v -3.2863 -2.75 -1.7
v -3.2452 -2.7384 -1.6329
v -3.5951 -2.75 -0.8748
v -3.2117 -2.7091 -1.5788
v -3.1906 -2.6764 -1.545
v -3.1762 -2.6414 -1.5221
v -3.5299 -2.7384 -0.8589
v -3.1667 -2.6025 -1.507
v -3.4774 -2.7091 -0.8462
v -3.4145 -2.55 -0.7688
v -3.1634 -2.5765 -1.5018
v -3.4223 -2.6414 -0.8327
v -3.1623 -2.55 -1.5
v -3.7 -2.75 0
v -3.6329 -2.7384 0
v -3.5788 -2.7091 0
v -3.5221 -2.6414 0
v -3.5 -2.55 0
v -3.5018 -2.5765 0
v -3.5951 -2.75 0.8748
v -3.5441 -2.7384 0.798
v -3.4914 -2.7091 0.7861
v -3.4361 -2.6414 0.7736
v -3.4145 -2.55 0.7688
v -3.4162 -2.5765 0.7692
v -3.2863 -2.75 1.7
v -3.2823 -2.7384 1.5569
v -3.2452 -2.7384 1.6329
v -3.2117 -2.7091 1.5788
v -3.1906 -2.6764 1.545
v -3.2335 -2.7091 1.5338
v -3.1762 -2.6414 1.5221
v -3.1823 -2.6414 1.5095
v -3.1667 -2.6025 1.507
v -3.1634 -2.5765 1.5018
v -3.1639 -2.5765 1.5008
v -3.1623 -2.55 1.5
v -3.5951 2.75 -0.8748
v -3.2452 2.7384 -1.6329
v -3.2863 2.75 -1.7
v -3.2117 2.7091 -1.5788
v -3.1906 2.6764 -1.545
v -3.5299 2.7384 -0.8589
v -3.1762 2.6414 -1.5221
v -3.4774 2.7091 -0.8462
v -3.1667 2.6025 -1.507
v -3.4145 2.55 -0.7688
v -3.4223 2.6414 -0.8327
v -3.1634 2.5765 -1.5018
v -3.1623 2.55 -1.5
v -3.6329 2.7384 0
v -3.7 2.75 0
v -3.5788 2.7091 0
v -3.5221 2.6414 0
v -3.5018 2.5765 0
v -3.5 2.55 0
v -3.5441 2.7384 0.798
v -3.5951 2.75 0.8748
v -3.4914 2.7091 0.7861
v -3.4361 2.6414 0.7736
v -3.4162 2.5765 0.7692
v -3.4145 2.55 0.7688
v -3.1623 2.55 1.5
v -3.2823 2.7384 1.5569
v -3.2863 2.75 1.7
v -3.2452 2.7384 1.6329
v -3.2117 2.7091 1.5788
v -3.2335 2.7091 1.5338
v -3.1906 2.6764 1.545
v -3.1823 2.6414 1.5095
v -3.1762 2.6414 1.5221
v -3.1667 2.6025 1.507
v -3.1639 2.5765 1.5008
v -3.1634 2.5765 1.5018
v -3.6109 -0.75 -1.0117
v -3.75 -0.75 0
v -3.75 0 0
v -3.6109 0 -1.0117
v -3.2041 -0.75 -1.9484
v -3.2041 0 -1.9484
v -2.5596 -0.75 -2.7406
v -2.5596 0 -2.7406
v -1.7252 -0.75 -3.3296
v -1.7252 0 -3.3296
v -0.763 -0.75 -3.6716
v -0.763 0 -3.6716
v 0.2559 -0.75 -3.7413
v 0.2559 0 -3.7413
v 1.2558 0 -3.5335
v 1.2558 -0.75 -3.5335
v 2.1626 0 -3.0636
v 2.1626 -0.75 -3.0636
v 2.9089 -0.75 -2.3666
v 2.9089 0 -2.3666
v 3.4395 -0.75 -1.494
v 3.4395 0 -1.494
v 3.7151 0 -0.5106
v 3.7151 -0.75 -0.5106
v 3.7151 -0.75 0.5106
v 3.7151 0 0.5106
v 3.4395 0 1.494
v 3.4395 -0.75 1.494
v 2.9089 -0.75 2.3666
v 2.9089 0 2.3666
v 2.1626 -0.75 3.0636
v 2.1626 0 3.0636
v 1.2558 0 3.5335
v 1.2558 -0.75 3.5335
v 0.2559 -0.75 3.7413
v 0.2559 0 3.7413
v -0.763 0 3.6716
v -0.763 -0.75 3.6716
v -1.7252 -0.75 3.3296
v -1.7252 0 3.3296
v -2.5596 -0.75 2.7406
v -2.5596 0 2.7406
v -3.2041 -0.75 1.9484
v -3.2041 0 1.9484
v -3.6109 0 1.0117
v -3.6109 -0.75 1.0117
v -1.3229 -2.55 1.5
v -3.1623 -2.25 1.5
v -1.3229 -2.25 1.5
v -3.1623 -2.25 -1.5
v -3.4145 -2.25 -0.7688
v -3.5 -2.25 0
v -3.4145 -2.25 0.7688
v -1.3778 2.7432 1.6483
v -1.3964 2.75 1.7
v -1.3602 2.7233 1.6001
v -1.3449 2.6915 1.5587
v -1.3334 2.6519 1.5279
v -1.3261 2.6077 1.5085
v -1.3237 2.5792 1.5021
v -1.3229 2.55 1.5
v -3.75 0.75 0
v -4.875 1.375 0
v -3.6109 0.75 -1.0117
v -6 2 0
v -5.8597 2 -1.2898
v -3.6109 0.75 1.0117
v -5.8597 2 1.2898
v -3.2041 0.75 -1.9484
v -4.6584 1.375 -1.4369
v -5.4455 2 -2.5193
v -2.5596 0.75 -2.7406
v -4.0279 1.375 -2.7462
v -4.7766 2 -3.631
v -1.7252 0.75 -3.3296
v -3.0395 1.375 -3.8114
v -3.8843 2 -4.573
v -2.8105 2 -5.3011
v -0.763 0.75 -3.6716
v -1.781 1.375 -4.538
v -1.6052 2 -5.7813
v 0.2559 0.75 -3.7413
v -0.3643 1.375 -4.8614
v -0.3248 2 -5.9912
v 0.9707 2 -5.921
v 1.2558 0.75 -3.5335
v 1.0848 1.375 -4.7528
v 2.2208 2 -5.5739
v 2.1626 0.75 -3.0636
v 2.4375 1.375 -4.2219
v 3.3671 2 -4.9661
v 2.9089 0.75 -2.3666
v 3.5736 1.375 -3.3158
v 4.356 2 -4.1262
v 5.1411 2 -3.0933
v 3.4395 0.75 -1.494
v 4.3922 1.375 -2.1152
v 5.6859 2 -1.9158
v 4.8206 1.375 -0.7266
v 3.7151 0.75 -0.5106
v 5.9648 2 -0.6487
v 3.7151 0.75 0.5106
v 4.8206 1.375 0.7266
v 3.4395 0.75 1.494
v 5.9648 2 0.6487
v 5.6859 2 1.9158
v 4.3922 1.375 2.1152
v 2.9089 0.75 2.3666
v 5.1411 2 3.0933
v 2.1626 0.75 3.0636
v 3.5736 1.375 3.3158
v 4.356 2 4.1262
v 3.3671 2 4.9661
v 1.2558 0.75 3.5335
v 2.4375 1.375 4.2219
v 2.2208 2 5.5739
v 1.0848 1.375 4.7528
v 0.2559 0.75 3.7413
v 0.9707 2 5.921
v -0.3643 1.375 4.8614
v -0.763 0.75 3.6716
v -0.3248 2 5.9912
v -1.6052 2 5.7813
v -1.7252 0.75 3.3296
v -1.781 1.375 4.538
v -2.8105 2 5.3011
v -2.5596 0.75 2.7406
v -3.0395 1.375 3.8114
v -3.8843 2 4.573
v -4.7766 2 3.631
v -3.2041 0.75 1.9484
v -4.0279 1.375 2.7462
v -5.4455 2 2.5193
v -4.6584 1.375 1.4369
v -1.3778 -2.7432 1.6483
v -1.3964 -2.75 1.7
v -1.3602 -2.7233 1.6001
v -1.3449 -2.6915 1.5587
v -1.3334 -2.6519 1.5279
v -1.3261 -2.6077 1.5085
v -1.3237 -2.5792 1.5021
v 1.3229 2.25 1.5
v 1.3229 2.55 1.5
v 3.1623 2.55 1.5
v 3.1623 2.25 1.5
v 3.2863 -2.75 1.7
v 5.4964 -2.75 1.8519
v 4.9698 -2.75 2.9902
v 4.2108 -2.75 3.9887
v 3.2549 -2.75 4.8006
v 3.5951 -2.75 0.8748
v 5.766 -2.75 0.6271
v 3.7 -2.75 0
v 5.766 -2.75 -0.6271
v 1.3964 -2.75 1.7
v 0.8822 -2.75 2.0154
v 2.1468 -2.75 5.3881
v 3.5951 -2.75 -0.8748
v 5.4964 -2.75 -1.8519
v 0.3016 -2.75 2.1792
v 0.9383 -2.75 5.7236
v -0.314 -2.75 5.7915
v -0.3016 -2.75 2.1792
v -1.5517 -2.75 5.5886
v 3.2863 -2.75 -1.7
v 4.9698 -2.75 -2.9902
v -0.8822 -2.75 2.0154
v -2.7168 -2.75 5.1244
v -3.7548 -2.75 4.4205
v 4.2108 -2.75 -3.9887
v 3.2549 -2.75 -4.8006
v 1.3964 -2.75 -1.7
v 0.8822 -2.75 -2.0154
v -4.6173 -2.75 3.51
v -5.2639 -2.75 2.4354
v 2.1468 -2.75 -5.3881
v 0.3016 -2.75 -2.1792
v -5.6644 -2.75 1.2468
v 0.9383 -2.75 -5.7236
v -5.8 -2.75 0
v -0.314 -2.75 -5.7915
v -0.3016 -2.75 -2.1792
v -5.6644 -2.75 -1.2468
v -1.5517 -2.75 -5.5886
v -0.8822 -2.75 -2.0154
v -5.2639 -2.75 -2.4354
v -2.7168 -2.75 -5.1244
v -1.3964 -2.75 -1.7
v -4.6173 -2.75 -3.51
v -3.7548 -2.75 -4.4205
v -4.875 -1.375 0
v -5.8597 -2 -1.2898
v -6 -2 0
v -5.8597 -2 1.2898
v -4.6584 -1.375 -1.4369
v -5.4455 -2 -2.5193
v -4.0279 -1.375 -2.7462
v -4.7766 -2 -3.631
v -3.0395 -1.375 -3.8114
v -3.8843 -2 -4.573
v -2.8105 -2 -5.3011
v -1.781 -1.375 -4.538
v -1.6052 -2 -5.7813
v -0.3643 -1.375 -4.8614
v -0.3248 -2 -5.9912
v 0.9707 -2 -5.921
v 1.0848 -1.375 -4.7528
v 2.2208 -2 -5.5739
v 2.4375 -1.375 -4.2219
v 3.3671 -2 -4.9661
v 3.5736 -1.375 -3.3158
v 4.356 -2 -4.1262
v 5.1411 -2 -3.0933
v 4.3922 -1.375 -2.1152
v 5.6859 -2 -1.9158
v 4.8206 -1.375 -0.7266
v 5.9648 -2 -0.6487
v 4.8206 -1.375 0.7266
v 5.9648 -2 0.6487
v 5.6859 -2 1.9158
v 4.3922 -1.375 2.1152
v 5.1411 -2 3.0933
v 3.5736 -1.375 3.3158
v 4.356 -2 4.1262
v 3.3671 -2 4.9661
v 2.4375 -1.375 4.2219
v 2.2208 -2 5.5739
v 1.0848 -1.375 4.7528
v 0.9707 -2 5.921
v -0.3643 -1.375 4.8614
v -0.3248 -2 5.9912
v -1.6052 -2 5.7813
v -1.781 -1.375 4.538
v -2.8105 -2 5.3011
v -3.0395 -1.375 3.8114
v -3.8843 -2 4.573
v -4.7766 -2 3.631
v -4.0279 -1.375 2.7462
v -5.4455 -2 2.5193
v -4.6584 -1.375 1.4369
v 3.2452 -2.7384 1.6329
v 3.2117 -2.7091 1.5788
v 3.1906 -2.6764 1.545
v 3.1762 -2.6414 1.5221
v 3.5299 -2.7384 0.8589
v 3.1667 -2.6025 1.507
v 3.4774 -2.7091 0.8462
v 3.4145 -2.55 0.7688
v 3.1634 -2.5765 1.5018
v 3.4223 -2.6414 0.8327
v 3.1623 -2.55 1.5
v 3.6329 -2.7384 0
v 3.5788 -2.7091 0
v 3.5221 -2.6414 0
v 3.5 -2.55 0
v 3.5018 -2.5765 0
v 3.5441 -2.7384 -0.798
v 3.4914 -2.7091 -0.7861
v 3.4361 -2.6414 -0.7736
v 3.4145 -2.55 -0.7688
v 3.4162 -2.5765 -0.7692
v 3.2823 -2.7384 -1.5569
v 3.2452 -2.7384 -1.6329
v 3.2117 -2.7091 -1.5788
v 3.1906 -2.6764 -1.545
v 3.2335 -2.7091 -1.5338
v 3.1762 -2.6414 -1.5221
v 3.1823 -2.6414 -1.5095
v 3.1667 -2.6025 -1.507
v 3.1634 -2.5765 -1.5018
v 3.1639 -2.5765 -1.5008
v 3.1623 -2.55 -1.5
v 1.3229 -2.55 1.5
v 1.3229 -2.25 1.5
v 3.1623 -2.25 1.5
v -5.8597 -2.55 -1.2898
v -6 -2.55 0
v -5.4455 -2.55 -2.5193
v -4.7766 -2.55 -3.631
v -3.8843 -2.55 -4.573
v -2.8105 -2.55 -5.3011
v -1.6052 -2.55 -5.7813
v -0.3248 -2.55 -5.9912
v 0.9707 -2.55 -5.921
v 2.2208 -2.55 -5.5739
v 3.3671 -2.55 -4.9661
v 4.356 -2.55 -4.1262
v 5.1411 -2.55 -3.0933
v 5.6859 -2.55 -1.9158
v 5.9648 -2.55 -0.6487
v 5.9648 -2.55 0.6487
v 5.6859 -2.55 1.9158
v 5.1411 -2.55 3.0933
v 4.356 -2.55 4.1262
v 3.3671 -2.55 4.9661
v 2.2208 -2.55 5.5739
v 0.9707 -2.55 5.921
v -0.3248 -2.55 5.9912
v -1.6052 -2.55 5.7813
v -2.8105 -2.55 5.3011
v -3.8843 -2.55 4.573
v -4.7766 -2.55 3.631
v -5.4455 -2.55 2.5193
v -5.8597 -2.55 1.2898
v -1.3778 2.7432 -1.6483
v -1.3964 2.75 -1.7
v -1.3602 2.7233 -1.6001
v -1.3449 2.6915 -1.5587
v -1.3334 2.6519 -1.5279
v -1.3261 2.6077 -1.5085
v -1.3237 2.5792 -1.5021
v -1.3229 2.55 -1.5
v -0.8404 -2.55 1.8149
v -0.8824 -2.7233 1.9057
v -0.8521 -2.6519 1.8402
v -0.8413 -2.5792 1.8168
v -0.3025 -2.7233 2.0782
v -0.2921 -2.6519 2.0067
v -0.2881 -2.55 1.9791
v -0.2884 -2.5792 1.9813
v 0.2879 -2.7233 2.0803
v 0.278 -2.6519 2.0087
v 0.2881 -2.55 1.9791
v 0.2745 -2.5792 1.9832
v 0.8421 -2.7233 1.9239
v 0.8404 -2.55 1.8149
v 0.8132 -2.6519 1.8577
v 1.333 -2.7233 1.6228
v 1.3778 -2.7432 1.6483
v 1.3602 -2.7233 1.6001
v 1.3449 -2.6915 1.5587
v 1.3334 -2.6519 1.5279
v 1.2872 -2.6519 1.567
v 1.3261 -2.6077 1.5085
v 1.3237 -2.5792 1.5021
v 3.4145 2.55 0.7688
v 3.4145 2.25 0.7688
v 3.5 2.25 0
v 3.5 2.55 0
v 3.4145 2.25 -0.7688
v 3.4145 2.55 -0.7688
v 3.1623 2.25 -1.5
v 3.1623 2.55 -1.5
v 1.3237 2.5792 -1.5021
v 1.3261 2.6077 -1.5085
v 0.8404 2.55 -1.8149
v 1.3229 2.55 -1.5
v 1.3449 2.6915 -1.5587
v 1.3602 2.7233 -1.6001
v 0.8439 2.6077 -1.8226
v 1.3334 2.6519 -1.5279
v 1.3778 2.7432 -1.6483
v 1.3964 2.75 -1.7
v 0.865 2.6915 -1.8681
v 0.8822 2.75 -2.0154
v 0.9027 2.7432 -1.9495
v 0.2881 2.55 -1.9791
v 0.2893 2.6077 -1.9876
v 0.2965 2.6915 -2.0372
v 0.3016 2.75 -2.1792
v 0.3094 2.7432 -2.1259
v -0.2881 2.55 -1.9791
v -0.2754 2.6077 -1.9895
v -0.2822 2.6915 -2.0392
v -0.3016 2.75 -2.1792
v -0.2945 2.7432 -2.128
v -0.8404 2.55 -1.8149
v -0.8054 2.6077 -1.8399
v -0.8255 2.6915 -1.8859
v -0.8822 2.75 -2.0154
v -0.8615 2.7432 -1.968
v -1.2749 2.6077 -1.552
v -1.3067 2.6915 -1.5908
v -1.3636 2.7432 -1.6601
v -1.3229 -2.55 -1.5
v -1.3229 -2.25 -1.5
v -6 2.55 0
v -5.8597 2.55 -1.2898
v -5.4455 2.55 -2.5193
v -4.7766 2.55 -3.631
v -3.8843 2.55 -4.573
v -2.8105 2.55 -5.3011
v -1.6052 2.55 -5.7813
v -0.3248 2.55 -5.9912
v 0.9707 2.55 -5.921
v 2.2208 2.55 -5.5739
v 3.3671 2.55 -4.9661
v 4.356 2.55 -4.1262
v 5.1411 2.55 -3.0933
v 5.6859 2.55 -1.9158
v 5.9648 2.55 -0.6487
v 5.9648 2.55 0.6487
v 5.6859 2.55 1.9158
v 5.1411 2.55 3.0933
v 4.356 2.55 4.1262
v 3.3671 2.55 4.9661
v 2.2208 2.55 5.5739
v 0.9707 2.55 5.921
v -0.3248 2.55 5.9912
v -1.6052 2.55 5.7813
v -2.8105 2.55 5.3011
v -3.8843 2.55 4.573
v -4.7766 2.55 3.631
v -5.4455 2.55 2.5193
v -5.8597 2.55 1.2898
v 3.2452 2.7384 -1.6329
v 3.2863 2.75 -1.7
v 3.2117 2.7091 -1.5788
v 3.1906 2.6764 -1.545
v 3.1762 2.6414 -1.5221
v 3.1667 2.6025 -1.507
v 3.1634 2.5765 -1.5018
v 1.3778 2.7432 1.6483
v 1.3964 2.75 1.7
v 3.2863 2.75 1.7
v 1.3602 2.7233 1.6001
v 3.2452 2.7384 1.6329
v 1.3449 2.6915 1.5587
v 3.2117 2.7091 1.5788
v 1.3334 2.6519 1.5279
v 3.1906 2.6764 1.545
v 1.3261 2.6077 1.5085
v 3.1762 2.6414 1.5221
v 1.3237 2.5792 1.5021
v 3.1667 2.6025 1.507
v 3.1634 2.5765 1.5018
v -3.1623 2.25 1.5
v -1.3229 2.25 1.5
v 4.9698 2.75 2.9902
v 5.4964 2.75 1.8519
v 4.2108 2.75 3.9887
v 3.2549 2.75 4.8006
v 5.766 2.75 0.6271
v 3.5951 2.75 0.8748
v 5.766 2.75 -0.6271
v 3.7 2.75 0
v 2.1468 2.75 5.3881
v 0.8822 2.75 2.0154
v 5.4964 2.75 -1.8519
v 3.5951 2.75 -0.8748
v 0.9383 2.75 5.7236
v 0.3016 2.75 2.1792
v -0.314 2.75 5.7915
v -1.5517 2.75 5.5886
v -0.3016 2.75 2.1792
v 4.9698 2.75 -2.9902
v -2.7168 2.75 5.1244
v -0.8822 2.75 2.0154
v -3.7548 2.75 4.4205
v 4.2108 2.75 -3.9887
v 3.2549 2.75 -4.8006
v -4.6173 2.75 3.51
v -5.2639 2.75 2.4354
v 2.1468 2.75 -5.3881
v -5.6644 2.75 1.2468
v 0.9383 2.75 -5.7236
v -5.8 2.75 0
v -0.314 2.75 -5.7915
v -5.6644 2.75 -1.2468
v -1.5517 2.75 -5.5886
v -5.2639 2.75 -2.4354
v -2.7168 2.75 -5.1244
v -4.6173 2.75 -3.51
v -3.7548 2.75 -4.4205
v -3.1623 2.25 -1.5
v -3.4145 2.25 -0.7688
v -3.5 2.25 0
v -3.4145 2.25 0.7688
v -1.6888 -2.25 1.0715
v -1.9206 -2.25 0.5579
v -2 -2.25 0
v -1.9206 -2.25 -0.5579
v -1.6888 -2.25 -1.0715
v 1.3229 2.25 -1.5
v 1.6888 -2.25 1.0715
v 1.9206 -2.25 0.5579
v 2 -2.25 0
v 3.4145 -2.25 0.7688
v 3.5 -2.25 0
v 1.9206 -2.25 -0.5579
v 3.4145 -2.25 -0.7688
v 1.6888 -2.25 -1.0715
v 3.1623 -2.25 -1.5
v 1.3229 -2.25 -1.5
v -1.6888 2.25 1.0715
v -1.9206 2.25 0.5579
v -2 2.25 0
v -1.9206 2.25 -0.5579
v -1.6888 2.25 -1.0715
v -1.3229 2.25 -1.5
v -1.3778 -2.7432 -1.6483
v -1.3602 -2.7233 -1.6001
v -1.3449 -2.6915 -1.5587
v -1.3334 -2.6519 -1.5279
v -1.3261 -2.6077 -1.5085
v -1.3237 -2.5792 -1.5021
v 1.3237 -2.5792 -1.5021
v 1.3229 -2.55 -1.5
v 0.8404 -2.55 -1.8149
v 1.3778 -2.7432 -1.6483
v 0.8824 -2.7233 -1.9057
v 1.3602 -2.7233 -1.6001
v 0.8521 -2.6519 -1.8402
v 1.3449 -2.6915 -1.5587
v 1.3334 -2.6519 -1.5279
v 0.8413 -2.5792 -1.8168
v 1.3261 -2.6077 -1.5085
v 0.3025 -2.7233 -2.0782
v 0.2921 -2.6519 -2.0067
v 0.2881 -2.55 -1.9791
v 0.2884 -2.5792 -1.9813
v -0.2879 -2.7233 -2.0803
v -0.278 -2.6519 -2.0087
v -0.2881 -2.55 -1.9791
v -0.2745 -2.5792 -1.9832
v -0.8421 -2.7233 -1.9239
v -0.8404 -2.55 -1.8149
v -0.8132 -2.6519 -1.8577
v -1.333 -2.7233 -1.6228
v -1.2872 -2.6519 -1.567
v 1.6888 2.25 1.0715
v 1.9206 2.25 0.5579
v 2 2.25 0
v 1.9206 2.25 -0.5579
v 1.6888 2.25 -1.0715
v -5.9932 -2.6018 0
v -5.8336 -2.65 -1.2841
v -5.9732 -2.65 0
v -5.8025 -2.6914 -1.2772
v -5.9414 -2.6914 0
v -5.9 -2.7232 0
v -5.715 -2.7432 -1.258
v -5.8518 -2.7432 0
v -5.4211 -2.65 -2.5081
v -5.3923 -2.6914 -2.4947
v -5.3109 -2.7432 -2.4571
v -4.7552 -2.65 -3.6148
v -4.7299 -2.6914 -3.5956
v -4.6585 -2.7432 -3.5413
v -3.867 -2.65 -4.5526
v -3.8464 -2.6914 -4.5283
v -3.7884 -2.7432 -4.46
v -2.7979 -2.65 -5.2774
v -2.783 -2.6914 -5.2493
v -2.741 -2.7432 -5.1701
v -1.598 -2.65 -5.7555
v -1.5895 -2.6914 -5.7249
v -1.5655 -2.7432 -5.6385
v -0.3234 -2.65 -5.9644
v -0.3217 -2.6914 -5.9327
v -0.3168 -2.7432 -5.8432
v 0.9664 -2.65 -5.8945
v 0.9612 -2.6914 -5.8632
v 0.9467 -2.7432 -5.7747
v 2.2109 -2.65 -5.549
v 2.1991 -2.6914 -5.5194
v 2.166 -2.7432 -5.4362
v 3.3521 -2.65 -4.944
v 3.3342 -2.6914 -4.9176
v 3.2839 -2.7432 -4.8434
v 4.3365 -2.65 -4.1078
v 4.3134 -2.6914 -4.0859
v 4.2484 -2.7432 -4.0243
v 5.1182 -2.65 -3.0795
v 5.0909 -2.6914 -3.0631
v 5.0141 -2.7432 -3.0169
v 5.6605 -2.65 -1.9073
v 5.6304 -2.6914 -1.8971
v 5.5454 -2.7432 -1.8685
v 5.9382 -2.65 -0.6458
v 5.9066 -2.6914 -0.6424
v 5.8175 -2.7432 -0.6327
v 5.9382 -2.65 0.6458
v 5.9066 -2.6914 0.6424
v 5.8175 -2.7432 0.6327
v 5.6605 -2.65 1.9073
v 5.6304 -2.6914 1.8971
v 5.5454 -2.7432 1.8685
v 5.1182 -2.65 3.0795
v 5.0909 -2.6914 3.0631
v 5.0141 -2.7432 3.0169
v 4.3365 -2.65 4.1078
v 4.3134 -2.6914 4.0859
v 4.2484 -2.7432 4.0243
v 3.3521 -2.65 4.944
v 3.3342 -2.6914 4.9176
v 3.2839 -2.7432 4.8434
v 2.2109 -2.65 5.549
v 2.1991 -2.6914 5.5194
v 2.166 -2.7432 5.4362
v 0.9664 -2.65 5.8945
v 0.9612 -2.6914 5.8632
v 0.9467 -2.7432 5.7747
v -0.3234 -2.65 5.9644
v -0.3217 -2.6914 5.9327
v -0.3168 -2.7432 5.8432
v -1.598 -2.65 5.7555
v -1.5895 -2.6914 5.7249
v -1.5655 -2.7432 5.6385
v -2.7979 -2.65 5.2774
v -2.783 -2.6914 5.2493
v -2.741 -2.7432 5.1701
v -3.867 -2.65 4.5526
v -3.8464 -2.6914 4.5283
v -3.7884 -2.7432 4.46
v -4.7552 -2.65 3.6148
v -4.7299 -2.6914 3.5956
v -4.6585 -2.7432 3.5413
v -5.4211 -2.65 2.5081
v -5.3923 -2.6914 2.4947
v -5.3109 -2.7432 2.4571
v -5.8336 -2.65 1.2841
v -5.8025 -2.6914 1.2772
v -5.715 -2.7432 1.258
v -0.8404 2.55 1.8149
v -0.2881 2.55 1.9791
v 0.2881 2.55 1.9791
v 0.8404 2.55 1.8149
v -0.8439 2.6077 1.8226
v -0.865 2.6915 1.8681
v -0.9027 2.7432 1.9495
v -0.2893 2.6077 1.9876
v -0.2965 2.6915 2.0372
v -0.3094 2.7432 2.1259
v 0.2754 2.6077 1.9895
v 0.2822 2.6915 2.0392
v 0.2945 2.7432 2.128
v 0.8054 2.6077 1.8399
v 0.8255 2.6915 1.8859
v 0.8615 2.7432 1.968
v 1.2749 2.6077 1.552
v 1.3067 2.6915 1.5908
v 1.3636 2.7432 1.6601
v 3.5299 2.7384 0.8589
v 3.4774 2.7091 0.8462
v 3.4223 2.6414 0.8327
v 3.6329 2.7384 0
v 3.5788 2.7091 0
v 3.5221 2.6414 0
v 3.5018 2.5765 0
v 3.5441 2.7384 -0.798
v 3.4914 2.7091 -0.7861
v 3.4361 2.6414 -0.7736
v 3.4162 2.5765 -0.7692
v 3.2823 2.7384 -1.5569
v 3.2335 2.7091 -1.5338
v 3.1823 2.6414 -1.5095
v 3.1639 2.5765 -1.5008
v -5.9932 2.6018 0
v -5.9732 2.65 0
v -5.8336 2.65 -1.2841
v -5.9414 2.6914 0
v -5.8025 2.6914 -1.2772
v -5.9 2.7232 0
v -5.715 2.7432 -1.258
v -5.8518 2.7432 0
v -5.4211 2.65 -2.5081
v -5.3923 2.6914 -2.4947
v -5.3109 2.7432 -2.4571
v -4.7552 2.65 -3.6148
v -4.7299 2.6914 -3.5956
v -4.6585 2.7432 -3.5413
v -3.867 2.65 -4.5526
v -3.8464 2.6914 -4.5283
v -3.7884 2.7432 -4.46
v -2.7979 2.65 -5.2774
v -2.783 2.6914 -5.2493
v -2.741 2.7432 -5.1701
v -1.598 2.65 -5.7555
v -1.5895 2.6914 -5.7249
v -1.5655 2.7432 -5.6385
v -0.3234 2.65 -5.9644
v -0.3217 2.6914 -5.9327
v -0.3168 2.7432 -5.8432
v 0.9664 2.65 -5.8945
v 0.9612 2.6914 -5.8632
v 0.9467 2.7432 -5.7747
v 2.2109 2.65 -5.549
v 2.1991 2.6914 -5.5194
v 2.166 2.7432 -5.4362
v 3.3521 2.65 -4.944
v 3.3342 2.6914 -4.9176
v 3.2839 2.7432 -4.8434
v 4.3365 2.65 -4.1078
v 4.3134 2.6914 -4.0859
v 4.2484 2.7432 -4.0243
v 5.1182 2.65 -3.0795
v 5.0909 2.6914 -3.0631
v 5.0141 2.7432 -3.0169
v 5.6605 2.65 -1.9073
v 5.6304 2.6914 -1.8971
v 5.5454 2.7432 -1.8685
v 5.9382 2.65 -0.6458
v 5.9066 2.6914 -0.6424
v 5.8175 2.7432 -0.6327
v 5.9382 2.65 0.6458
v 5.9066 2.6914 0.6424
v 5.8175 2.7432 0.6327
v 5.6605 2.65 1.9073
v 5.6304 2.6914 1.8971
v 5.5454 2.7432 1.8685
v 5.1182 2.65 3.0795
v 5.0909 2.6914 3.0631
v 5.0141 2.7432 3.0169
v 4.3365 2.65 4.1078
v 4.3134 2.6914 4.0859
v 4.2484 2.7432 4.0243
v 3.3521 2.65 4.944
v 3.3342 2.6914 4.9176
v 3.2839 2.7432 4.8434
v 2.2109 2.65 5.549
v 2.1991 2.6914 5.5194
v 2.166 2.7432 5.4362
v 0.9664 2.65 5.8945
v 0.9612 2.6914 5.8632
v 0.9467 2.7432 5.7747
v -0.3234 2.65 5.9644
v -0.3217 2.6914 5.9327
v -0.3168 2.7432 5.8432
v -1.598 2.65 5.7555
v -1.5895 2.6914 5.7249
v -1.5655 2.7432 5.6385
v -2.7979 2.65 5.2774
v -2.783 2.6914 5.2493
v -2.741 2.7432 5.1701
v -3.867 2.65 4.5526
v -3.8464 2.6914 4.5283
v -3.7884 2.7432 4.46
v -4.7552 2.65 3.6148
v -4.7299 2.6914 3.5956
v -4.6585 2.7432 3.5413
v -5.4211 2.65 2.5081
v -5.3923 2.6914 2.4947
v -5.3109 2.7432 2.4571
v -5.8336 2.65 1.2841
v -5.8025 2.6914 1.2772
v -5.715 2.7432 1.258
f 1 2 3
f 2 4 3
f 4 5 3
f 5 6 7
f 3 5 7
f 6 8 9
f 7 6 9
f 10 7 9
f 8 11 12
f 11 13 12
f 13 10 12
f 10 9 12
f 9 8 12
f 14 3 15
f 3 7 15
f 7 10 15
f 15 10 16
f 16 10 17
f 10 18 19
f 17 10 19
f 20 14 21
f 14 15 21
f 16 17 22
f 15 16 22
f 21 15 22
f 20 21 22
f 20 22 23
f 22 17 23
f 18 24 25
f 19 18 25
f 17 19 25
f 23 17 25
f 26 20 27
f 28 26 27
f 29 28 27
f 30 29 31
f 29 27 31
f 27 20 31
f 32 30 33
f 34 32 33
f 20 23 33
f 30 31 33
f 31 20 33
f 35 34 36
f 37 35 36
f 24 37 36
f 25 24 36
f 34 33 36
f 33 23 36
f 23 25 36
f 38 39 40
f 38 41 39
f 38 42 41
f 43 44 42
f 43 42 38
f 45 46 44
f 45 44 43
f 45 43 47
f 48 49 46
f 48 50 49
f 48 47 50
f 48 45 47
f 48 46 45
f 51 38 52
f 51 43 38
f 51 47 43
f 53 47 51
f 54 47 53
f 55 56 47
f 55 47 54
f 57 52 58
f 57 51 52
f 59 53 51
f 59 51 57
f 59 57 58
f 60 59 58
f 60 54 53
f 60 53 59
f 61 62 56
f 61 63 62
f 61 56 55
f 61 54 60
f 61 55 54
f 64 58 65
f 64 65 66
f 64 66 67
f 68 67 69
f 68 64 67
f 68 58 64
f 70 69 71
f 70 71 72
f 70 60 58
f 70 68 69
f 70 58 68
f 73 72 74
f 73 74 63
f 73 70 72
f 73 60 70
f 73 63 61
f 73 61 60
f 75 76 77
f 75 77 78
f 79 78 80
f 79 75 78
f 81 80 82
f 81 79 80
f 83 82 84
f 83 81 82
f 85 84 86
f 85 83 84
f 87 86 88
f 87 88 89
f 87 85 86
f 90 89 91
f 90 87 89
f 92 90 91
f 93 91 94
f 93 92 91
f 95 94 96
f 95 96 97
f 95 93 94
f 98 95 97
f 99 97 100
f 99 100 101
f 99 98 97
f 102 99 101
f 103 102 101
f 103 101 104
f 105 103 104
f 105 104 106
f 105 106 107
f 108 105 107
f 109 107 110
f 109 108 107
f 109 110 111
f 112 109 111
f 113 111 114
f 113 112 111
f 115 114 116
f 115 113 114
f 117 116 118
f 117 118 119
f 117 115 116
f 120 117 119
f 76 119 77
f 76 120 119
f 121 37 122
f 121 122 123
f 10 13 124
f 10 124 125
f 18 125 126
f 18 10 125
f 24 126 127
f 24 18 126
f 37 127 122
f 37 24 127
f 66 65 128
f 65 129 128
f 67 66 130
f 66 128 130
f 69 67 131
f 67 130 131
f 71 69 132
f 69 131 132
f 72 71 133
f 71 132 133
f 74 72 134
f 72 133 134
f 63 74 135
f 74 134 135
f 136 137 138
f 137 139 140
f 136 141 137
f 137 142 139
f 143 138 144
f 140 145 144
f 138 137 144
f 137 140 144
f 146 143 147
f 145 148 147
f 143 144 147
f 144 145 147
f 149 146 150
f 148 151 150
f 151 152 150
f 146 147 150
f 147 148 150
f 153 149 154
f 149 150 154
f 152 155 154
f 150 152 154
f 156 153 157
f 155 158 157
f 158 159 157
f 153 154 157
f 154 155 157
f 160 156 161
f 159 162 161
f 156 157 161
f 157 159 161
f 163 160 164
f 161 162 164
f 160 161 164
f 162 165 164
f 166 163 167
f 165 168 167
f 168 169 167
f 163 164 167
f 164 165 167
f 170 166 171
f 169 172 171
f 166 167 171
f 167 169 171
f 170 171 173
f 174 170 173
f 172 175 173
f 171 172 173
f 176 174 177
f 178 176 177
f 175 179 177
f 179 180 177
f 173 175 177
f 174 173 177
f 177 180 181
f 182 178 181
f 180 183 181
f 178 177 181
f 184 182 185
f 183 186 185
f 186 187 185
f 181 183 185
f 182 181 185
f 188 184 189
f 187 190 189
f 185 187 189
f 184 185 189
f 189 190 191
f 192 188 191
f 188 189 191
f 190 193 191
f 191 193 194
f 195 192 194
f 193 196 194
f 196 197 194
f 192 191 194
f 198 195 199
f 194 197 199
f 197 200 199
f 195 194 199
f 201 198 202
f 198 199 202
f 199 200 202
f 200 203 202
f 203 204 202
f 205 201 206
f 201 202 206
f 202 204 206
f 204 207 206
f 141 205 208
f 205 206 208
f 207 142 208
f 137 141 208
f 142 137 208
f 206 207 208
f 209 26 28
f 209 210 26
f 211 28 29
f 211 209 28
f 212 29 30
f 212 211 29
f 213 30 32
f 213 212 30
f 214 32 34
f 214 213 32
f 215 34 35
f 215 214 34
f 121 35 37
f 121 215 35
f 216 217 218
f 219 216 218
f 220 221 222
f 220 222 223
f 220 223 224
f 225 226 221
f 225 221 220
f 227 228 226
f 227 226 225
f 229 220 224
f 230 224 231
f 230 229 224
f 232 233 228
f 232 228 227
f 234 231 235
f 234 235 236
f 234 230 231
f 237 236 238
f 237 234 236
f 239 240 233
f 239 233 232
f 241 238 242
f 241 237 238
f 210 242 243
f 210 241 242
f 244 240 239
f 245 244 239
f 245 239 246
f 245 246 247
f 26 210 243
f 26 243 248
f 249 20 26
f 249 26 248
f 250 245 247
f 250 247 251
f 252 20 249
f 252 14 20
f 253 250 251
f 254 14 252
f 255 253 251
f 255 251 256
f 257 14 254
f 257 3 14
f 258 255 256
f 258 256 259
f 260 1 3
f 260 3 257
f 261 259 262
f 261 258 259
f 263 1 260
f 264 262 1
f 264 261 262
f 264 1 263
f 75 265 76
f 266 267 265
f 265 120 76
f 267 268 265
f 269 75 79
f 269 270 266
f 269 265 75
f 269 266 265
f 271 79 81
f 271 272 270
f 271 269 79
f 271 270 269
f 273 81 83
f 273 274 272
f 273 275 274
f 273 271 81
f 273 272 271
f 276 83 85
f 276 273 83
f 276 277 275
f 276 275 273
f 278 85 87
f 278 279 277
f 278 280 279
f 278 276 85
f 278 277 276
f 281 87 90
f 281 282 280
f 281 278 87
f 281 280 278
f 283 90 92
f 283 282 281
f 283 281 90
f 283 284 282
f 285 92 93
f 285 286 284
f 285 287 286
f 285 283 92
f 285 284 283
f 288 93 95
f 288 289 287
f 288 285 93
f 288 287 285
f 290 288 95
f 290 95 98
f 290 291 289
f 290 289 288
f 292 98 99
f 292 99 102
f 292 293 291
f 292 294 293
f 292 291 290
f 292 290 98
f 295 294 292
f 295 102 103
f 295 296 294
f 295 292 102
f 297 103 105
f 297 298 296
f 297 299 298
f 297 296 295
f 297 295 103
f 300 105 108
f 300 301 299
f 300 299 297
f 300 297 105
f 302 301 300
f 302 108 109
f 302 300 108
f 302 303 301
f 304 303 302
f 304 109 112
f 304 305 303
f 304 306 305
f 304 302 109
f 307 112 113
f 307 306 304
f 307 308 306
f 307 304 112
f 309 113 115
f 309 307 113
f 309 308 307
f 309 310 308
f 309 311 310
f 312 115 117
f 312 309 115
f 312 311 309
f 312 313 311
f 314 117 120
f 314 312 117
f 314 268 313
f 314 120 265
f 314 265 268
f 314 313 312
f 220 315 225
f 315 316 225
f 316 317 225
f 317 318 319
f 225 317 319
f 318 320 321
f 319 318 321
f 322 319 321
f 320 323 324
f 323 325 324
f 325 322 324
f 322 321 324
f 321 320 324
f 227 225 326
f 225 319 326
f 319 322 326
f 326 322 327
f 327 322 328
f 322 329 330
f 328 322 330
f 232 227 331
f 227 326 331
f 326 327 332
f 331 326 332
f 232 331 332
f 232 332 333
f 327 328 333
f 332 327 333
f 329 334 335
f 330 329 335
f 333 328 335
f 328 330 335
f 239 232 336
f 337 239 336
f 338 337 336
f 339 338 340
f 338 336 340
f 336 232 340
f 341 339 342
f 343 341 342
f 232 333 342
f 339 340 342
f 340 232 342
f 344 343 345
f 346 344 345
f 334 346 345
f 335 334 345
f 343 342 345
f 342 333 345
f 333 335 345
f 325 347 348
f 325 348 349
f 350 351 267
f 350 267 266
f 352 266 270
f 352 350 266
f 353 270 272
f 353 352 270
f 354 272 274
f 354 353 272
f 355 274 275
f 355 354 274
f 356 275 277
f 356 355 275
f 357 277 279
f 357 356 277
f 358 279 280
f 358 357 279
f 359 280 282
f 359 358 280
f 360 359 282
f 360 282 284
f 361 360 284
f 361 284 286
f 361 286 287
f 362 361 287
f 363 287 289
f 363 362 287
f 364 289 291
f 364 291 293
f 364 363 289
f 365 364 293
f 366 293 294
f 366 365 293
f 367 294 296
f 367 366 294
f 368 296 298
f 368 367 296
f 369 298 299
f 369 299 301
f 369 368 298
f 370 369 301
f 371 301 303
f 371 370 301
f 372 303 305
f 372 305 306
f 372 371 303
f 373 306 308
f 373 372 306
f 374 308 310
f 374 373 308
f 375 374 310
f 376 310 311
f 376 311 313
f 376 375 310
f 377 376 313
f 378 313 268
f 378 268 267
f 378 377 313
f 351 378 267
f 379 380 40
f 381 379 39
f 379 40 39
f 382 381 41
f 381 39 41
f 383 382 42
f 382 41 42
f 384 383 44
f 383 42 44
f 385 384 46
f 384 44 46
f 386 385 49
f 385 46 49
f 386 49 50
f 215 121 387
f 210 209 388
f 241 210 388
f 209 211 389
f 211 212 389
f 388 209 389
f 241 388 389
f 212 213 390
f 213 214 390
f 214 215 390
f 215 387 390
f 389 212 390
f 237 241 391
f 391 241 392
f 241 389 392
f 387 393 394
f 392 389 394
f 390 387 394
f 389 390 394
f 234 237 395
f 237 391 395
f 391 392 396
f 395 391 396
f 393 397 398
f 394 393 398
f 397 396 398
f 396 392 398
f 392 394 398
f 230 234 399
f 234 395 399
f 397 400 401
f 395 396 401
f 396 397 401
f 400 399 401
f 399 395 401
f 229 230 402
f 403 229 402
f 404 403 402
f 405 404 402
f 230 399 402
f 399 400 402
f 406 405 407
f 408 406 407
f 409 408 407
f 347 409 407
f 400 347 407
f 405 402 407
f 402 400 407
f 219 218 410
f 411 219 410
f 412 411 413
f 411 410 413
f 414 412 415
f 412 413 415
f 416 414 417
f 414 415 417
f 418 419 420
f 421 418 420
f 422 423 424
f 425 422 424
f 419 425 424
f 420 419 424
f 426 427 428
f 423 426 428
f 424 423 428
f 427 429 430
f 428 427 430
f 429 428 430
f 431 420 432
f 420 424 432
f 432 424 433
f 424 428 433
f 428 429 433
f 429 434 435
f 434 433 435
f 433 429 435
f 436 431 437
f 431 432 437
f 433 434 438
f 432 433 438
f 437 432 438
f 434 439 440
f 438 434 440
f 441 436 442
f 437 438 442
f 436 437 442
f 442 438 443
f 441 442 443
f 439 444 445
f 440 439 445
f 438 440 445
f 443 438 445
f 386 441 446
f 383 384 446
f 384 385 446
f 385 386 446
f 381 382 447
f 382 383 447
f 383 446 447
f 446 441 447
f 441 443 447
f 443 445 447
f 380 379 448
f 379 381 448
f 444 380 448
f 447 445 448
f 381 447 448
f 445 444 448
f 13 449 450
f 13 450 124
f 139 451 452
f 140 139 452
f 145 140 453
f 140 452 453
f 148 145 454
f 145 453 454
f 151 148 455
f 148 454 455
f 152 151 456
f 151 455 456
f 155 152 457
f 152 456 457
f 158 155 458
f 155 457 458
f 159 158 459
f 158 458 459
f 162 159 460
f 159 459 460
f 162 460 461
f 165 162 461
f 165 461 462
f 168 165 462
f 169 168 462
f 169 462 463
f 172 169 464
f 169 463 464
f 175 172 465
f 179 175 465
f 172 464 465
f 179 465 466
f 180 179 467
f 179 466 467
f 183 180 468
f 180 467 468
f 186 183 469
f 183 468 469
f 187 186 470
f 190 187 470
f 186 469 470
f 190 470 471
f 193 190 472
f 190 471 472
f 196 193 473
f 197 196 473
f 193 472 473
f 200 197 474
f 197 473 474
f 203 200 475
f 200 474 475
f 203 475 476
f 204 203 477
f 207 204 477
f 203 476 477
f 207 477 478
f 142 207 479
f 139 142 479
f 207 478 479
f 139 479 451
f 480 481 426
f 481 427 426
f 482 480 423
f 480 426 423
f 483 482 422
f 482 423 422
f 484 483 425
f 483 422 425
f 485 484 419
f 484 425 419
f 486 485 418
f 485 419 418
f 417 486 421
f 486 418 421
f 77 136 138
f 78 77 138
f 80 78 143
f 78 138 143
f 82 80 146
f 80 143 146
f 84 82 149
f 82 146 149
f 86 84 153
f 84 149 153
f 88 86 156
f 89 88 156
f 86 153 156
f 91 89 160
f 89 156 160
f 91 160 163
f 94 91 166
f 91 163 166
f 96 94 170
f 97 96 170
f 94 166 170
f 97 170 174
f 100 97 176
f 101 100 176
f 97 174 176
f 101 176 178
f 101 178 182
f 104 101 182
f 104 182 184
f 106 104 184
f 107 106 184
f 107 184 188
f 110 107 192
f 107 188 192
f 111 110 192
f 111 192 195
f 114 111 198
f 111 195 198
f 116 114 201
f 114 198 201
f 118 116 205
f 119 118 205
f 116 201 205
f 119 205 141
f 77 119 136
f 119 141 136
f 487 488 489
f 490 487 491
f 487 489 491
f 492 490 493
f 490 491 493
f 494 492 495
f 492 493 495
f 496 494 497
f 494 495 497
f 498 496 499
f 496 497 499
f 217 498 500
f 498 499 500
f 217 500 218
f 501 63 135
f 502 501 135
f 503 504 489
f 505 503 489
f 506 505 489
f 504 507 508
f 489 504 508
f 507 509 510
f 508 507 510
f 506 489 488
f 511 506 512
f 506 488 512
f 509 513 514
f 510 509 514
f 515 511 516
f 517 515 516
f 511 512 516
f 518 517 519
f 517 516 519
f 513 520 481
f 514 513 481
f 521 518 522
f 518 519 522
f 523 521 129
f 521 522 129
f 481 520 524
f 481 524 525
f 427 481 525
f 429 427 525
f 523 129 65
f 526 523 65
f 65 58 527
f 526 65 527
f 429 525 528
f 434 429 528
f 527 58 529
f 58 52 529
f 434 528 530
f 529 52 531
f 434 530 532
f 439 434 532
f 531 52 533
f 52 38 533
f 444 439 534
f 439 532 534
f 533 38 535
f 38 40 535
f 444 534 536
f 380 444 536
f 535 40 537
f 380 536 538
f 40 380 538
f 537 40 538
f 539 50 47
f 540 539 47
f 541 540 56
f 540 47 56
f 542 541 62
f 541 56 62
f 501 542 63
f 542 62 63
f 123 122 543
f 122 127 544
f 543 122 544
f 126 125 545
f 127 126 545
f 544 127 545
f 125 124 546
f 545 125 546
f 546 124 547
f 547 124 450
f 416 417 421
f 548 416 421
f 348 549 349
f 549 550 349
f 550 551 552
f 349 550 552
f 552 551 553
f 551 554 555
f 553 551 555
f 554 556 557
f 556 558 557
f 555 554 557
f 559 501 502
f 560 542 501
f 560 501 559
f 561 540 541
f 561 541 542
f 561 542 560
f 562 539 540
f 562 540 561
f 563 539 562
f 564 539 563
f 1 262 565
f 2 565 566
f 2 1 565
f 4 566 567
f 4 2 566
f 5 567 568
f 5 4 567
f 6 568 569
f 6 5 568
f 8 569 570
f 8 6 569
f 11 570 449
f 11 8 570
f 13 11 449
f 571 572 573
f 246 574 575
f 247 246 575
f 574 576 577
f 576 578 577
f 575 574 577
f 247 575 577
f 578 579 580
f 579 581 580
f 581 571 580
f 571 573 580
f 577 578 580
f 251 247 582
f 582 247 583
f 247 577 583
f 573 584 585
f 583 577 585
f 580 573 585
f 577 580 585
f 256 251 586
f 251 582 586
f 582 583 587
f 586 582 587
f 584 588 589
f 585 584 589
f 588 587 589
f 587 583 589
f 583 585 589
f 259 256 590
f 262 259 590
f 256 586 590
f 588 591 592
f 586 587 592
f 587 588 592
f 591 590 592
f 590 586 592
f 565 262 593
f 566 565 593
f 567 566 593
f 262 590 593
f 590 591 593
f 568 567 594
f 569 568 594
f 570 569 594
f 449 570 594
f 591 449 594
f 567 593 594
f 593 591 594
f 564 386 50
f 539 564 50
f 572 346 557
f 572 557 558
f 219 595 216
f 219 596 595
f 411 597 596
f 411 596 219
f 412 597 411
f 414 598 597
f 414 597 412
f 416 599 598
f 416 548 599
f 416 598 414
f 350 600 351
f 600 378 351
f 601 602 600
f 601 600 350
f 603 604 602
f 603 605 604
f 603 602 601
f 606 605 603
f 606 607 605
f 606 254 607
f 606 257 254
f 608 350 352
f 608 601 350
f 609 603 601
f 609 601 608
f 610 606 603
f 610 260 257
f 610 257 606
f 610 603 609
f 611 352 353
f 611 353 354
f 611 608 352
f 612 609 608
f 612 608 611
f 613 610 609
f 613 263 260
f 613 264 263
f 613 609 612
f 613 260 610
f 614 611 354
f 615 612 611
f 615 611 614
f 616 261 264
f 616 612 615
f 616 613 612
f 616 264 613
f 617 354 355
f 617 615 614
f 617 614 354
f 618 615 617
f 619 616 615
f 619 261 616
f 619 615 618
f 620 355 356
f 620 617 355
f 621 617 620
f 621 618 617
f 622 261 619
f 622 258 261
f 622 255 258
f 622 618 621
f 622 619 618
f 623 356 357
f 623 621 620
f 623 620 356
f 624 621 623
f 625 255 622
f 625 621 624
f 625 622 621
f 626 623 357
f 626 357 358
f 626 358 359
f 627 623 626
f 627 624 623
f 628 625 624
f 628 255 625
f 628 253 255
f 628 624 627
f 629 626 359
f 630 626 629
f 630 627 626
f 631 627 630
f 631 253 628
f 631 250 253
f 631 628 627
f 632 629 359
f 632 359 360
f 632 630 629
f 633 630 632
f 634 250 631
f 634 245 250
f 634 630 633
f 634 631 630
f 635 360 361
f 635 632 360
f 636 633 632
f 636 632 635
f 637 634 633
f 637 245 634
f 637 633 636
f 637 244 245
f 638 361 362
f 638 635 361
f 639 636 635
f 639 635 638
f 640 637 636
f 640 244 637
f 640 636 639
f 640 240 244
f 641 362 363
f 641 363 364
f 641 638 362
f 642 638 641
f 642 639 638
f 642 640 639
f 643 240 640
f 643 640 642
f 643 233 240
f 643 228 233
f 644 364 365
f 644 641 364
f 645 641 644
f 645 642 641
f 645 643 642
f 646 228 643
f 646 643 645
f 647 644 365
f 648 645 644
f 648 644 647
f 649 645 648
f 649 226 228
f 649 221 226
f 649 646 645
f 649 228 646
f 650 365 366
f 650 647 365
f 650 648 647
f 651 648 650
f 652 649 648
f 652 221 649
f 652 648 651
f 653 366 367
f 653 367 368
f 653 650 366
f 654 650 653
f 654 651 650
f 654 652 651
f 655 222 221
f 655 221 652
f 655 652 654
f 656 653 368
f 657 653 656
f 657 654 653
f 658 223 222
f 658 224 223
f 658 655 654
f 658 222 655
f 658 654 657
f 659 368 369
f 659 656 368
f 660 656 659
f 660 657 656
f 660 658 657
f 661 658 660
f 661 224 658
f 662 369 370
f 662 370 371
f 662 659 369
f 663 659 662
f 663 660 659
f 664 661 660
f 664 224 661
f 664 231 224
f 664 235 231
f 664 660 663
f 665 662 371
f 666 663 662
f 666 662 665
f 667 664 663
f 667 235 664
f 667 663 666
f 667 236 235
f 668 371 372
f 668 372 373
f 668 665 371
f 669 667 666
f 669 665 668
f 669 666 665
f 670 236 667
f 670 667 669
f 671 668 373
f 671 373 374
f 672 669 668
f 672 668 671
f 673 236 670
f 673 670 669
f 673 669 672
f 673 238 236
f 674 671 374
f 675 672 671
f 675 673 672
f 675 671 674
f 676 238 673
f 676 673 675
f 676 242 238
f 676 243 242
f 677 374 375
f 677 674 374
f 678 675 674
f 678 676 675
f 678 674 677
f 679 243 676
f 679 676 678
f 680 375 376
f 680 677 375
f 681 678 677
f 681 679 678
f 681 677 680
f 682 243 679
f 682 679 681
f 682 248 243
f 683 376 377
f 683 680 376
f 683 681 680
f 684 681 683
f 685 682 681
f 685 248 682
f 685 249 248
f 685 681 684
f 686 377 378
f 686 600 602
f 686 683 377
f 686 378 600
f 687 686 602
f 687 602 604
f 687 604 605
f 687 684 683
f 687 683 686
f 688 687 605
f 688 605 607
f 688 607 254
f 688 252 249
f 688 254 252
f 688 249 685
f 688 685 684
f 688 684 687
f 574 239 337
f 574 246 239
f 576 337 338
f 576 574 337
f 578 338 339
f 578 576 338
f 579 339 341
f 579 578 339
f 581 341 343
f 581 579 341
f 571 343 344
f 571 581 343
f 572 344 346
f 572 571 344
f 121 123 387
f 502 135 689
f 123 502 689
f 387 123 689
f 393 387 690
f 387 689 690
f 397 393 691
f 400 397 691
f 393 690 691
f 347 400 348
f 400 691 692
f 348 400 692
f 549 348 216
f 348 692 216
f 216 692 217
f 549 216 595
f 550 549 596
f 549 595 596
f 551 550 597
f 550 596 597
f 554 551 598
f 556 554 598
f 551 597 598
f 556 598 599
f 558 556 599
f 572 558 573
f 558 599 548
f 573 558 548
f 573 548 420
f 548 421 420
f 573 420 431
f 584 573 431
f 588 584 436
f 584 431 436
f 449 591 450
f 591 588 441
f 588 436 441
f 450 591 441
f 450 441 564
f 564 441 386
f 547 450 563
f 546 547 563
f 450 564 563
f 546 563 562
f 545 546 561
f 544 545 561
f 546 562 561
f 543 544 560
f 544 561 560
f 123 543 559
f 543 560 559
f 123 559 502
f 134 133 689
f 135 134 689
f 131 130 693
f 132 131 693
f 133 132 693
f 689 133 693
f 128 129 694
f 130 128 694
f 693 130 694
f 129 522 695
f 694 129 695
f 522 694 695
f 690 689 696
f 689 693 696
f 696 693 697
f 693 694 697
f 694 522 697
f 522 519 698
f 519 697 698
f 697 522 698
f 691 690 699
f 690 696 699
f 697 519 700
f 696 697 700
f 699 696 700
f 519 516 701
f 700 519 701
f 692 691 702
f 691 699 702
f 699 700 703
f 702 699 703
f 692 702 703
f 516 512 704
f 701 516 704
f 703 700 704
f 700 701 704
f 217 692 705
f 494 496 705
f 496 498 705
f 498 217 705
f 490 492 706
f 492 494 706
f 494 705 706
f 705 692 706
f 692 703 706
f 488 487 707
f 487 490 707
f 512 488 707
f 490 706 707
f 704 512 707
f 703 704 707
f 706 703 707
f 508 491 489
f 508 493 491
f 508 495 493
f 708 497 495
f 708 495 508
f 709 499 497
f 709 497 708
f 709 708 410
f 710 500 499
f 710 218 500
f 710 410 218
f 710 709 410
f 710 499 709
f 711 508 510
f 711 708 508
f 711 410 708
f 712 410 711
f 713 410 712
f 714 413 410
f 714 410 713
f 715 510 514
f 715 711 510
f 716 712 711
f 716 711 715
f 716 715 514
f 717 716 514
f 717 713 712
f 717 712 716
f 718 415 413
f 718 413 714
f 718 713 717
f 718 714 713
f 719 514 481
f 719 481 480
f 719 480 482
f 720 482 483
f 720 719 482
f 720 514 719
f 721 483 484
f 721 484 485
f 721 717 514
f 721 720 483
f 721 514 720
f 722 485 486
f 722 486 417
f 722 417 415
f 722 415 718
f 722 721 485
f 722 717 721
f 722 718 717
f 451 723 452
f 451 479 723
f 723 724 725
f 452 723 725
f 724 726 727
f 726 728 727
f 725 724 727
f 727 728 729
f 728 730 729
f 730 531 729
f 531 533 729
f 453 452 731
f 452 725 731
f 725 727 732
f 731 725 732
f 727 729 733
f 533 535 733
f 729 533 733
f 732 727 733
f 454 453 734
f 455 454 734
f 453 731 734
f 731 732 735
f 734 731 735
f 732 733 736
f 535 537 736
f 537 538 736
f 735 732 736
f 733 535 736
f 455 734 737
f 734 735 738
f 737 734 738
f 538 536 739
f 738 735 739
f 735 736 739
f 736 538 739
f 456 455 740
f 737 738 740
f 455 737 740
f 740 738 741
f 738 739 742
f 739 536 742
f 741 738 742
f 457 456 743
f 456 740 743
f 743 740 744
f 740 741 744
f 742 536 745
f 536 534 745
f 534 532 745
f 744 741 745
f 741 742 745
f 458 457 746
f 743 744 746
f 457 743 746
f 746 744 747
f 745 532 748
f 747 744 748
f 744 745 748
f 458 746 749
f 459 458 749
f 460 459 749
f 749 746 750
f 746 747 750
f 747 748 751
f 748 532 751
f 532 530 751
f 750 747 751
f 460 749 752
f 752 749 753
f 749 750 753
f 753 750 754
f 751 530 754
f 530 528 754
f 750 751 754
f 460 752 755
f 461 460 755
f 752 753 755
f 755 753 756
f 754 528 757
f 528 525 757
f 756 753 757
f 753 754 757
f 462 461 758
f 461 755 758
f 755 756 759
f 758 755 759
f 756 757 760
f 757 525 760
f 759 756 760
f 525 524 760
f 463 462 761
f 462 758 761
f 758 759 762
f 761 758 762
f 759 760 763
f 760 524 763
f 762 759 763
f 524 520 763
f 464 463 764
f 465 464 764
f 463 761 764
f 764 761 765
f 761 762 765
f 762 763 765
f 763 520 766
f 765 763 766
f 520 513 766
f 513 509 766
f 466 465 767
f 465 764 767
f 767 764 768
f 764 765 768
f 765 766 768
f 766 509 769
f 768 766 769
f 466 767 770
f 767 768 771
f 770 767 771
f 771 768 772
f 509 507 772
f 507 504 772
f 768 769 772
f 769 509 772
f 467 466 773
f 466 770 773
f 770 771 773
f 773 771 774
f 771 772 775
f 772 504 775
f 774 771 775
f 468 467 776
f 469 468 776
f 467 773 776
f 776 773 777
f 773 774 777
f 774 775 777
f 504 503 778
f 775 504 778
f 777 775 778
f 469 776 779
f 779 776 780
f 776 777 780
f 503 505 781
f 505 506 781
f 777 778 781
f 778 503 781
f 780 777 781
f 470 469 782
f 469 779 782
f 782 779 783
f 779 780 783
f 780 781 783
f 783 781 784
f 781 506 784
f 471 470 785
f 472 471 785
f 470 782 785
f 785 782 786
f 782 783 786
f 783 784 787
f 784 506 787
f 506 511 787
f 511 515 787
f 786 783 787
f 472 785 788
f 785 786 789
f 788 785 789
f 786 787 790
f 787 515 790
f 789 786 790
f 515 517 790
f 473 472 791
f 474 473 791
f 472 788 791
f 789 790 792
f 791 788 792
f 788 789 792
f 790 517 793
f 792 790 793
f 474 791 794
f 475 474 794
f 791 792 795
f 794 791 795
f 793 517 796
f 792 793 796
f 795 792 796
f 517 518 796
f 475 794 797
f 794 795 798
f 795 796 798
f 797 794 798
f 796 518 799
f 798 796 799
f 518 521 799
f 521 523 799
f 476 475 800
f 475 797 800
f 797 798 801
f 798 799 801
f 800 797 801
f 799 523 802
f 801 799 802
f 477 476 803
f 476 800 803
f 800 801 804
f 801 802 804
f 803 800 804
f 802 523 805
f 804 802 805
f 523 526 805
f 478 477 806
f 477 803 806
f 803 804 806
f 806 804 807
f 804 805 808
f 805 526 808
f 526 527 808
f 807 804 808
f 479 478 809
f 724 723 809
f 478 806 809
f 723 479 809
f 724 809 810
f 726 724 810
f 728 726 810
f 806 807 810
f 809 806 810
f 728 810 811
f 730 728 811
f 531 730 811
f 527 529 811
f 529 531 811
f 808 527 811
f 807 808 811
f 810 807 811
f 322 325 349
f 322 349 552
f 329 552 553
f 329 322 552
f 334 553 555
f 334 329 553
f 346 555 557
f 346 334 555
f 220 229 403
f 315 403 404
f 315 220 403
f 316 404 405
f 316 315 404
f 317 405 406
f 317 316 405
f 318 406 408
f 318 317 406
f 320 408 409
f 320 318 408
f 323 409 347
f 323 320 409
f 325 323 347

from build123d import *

# Parameters (mm, degrees)
CUT_EXTRUDE_1_DEPTH = 0.5
SKETCH_3_R          = 2
CUT_EXTRUDE_2_DEPTH = 11.111874208
FILLET_1_R          = 0.2


with BuildPart() as part:
    # 草图1 → 旋转1 (revolve)
    with BuildSketch(Plane.XY, mode=Mode.PRIVATE) as revolve_1_sk:
        Polygon((0, 0), (3.75, 0), (3.75, 0.75), (6, 2), (6, 2.75), (0, 2.75), align=None)
    revolve_1 = revolve(revolve_1_sk.sketch.rotate(Axis((0, 2.75, 0), (0, -1, 0)), 180), axis=Axis((0, 2.75, 0), (0, -1, 0)))

    # 镜向1: 旋转1 across plane
    add(revolve_1.mirror(Plane.ZX))

    # 草图2 → 切除-拉伸1 (cut)
    with BuildSketch(Plane(origin=(0, 2.75, 0), x_dir=(1, 0, 0), z_dir=(0, 1, 0))):
        with BuildLine():
            Line((3.16227766, 1.5), (-3.16227766, 1.5))
            ThreePointArc((-3.16227766, 1.5), (-3.5, 0), (-3.16227766, -1.5))
            Line((-3.16227766, -1.5), (3.16227766, -1.5))
            ThreePointArc((3.16227766, -1.5), (3.5, 0), (3.16227766, 1.5))
        make_face()
    cut_extrude_1 = extrude(amount=-CUT_EXTRUDE_1_DEPTH, mode=Mode.SUBTRACT)

    # 镜向2: 切除-拉伸1 across plane
    add(cut_extrude_1.mirror(Plane.ZX), mode=Mode.SUBTRACT)

    # 草图3 → 切除-拉伸2 (cut, through all)
    with BuildSketch(Plane(origin=(0, 2.75, 0), x_dir=(1, 0, 0), z_dir=(0, 1, 0))):
        with Locations(Location((0, 0, 0), (0, 0, 228.590377891))):
            Circle(SKETCH_3_R)
    extrude(amount=-CUT_EXTRUDE_2_DEPTH, mode=Mode.SUBTRACT)

    # 圆角1
    fillet_1_edges = [part.edges().sort_by_distance(p)[0] for p in [
        (6, -2.75, 0),
        (3.5, 2.75, 0),
        (2.242576658, 2.75, -1.5),
        (-3.5, 2.75, 0),
        (-2.242576658, 2.75, 1.5),
        (3.5, -2.75, 0),
        (2.242576658, -2.75, -1.5),
        (-3.5, -2.75, 0),
        (-2.242576658, -2.75, 1.5),
        (2.242576658, -2.75, 1.5),
        (-2.242576658, -2.75, -1.5),
        (6, 2.75, 0),
        (-2.242576658, 2.75, -1.5),
        (2.242576658, 2.75, 1.5),
        (0, 2.75, 2),
        (0, 2.75, -2),
        (0, -2.75, 2),
        (0, -2.75, -2),
    ]]
    fillet(fillet_1_edges, radius=FILLET_1_R)


solid = part.part
